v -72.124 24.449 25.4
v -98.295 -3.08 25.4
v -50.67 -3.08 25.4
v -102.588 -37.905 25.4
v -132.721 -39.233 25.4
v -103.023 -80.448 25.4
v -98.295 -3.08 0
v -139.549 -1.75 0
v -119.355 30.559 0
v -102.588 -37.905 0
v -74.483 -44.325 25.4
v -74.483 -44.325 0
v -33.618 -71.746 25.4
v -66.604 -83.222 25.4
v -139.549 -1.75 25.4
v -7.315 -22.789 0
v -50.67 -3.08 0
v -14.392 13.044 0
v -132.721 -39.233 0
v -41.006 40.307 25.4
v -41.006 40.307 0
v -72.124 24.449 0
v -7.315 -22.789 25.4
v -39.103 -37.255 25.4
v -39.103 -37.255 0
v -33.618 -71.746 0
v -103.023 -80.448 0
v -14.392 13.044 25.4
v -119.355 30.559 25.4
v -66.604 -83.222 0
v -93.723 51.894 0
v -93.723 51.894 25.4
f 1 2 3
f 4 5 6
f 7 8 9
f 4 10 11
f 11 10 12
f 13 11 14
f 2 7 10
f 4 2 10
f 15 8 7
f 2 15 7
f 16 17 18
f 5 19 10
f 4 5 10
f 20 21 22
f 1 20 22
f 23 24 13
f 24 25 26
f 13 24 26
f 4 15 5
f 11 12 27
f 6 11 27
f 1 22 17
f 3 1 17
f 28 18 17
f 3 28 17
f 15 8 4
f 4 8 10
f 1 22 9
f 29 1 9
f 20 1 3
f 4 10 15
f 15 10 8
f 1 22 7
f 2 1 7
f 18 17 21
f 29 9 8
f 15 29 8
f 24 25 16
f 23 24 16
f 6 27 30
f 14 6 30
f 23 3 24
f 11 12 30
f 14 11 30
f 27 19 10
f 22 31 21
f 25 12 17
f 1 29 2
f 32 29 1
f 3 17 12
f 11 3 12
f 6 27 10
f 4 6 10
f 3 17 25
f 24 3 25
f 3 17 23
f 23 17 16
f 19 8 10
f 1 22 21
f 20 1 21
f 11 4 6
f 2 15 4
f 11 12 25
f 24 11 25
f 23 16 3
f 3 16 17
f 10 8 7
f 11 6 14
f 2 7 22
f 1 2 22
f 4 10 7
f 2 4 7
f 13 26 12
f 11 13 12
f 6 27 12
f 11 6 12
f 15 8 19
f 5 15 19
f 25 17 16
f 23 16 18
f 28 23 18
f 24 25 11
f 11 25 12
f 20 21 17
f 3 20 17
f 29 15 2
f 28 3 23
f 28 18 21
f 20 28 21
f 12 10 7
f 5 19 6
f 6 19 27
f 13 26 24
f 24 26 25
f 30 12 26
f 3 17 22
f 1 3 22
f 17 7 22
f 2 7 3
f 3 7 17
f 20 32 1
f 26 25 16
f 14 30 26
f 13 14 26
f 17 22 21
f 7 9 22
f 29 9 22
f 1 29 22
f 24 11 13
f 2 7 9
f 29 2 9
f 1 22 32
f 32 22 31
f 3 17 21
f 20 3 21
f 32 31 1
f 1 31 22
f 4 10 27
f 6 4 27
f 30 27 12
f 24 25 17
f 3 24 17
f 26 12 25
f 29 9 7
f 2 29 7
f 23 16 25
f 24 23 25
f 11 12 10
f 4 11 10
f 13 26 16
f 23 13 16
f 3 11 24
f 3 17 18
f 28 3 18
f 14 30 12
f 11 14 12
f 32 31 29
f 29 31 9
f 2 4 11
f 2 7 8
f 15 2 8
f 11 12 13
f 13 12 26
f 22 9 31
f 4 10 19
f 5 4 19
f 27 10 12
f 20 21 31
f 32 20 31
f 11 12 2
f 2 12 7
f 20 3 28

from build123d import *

# Parameters (mm, degrees)
F1_DEPTH = 25.4
F2_DEPTH = 25.4
F3_DEPTH = 25.4


with BuildPart() as f1:
    # F0 (on Top) → F1 (new body)
    with BuildSketch(Plane.XY):
        Polygon((-139.548727, -1.749934), (-98.295171, -3.080259), (-119.355322, 30.558523), align=None)
        Polygon((-102.588175, -37.905204), (-74.482671, -44.324719), (-98.295171, -3.080259), align=None)
        Polygon((-132.721425, -39.233236), (-103.023194, -80.44798), (-102.588175, -37.905204), align=None)
        Polygon((-66.603505, -83.22223), (-74.482671, -44.324719), (-103.023194, -80.44798), align=None)
        Polygon((-39.103412, -37.254637), (-74.482671, -44.324719), (-33.617825, -71.746143), align=None)
        Polygon((-7.314813, -22.789485), (-50.670171, -3.080259), (-39.103412, -37.254637), align=None)
        Polygon((-41.006373, 40.30653), (-50.670171, -3.080259), (-14.391694, 13.043573), align=None)
        Polygon((-93.722842, 51.894216), (-72.12382, 24.449037), (-41.006373, 40.30653), align=None)
        Polygon((-72.12382, 24.449037), (-98.295171, -3.080259), (-50.670171, -3.080259), align=None)
    extrude(amount=F1_DEPTH)


with BuildPart() as f2:
    # F0 (on Top) → F2 (new body)
    with BuildSketch(Plane.XY):
        Polygon((-93.722842, 51.894216), (-119.355322, 30.558523), (-72.12382, 24.449037), align=None)
        Polygon((-72.12382, 24.449037), (-50.670171, -3.080259), (-41.006373, 40.30653), align=None)
        Polygon((-14.391694, 13.043573), (-50.670171, -3.080259), (-7.314813, -22.789485), align=None)
        Polygon((-39.103412, -37.254637), (-33.617825, -71.746143), (-7.314813, -22.789485), align=None)
        Polygon((-50.670171, -3.080259), (-74.482671, -44.324719), (-39.103412, -37.254637), align=None)
        Polygon((-33.617825, -71.746143), (-74.482671, -44.324719), (-66.603505, -83.22223), align=None)
        Polygon((-103.023194, -80.44798), (-74.482671, -44.324719), (-102.588175, -37.905204), align=None)
        Polygon((-132.721425, -39.233236), (-102.588175, -37.905204), (-139.548727, -1.749934), align=None)
    extrude(amount=F2_DEPTH)


with BuildPart() as f3:
    # F0 (on Top) → F3 (new body)
    with BuildSketch(Plane.XY):
        Polygon((-102.588175, -37.905204), (-98.295171, -3.080259), (-139.548727, -1.749934), align=None)
        Polygon((-119.355322, 30.558523), (-98.295171, -3.080259), (-72.12382, 24.449037), align=None)
    extrude(amount=F3_DEPTH)


solid = Compound([f1.part, f2.part, f3.part])
